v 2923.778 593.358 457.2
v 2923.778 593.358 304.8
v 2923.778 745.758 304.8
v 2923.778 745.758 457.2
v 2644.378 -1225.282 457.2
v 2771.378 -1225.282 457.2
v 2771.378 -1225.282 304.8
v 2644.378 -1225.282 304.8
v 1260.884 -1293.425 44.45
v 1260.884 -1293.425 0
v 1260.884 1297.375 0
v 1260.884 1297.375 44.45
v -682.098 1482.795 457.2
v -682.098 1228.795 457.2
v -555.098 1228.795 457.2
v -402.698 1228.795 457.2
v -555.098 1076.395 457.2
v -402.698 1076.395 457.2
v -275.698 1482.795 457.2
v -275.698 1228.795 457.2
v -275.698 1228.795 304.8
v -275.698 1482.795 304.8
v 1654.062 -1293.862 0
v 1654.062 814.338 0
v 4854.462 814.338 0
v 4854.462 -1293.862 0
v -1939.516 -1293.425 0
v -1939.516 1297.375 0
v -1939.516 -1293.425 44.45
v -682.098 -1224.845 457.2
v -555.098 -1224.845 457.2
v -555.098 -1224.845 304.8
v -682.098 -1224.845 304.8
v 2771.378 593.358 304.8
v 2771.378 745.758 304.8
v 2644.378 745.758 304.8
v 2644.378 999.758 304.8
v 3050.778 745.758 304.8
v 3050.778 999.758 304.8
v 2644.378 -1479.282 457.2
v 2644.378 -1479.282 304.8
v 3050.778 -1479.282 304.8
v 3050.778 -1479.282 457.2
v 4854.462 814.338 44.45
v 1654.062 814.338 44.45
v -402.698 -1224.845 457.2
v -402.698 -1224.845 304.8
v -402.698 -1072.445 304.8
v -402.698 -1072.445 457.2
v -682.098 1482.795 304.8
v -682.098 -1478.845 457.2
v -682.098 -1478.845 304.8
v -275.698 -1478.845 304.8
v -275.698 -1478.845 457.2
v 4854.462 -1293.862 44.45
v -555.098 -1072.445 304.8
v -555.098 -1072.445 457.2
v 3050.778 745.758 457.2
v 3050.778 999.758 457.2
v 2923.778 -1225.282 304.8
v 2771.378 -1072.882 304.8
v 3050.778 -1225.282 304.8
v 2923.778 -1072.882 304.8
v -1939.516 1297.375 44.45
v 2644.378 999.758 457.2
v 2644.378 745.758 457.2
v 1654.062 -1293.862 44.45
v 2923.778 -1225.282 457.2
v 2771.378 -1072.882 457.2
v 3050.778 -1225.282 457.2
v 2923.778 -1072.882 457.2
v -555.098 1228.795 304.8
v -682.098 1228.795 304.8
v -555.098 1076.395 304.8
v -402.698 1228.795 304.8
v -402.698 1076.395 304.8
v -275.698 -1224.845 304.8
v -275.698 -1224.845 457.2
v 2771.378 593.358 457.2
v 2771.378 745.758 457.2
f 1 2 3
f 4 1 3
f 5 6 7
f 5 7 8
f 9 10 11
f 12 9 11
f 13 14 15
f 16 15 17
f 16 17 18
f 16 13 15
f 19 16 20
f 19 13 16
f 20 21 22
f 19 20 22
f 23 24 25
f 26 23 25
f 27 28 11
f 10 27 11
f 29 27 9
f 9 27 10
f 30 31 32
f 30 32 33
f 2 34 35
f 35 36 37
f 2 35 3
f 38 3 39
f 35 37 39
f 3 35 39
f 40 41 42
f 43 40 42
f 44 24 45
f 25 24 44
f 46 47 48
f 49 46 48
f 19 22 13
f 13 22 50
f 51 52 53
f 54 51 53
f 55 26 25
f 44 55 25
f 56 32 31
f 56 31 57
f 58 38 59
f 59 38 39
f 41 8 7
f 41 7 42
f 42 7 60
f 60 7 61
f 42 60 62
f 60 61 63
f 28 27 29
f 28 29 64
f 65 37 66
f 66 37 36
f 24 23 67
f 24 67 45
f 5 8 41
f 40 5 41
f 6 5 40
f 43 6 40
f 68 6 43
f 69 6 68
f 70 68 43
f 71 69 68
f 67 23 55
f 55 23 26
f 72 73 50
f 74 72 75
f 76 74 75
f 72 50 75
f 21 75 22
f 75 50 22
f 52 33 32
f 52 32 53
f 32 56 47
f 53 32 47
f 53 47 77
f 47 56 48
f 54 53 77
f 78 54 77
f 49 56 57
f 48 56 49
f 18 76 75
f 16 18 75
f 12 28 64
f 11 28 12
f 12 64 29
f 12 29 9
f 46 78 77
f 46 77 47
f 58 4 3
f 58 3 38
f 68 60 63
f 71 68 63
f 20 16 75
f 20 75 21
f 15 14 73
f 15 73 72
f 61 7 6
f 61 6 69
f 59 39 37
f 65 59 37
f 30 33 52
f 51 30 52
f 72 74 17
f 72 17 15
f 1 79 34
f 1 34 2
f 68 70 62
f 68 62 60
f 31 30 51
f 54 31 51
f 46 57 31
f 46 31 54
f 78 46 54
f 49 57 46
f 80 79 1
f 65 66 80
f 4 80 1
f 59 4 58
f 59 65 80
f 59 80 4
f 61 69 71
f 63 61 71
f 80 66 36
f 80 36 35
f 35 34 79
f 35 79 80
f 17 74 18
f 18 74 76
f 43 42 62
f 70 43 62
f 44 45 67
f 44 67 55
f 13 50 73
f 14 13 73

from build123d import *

# Parameters (mm, degrees)
F0_W      = 3200.4
F0_H      = 2590.8
F1_DEPTH  = 44.45
F2_W      = 3200.4
F2_H      = 2108.2
F3_DEPTH  = 44.45
F7_W      = 152.4
F7_H      = 152.4
F8_DEPTH  = 152.4
F9_W      = 152.4
F9_H      = 152.4
F10_DEPTH = 152.4


with BuildPart() as f1:
    # F0 (on Top) → F1 (new body)
    with BuildSketch(Plane.XY):
        with Locations((-339.315792, 1.97465)):
            Rectangle(F0_W, F0_H)
    extrude(amount=F1_DEPTH)


with BuildPart() as f3:
    # F2 (on Top) → F3 (new body)
    with BuildSketch(Plane.XY):
        with Locations((3254.261732, -239.762257)):
            Rectangle(F2_W, F2_H)
    extrude(amount=F3_DEPTH)


with BuildPart() as f8:
    # F7 (on offset) → F8 (new body)
    with BuildSketch(Plane.XY.offset(304.8)):
        Polygon((-275.698421, 1482.79465), (-682.098421, 1482.79465), (-682.098421, 1228.79465), (-555.098421, 1228.79465), (-402.698421, 1228.79465), (-275.698421, 1228.79465), align=None)
        with Locations((-478.898421, 1152.59465)):
            Rectangle(F7_W, F7_H)
        Polygon((-555.098421, -1224.84535), (-682.098421, -1224.84535), (-682.098421, -1478.84535), (-275.698421, -1478.84535), (-275.698421, -1224.84535), (-402.698421, -1224.84535), align=None)
        with Locations((-478.898421, -1148.64535)):
            Rectangle(F7_W, F7_H)
    extrude(amount=F8_DEPTH)


with BuildPart() as f10:
    # F9 (on offset) → F10 (new body)
    with BuildSketch(Plane.XY.offset(304.8)):
        Polygon((2644.378057, 745.757743), (2771.378057, 745.757743), (2923.778057, 745.757743), (3050.778057, 745.757743), (3050.778057, 999.757743), (2644.378057, 999.757743), align=None)
        with Locations((2847.578057, 669.557743)):
            Rectangle(F9_W, F9_H)
        with Locations((2847.578057, -1149.082257)):
            Rectangle(F9_W, F9_H)
        Polygon((2923.778057, -1225.282257), (2771.378057, -1225.282257), (2644.378057, -1225.282257), (2644.378057, -1479.282257), (3050.778057, -1479.282257), (3050.778057, -1225.282257), align=None)
    extrude(amount=F10_DEPTH)


solid = Compound([f1.part, f3.part, f8.part, f10.part])
